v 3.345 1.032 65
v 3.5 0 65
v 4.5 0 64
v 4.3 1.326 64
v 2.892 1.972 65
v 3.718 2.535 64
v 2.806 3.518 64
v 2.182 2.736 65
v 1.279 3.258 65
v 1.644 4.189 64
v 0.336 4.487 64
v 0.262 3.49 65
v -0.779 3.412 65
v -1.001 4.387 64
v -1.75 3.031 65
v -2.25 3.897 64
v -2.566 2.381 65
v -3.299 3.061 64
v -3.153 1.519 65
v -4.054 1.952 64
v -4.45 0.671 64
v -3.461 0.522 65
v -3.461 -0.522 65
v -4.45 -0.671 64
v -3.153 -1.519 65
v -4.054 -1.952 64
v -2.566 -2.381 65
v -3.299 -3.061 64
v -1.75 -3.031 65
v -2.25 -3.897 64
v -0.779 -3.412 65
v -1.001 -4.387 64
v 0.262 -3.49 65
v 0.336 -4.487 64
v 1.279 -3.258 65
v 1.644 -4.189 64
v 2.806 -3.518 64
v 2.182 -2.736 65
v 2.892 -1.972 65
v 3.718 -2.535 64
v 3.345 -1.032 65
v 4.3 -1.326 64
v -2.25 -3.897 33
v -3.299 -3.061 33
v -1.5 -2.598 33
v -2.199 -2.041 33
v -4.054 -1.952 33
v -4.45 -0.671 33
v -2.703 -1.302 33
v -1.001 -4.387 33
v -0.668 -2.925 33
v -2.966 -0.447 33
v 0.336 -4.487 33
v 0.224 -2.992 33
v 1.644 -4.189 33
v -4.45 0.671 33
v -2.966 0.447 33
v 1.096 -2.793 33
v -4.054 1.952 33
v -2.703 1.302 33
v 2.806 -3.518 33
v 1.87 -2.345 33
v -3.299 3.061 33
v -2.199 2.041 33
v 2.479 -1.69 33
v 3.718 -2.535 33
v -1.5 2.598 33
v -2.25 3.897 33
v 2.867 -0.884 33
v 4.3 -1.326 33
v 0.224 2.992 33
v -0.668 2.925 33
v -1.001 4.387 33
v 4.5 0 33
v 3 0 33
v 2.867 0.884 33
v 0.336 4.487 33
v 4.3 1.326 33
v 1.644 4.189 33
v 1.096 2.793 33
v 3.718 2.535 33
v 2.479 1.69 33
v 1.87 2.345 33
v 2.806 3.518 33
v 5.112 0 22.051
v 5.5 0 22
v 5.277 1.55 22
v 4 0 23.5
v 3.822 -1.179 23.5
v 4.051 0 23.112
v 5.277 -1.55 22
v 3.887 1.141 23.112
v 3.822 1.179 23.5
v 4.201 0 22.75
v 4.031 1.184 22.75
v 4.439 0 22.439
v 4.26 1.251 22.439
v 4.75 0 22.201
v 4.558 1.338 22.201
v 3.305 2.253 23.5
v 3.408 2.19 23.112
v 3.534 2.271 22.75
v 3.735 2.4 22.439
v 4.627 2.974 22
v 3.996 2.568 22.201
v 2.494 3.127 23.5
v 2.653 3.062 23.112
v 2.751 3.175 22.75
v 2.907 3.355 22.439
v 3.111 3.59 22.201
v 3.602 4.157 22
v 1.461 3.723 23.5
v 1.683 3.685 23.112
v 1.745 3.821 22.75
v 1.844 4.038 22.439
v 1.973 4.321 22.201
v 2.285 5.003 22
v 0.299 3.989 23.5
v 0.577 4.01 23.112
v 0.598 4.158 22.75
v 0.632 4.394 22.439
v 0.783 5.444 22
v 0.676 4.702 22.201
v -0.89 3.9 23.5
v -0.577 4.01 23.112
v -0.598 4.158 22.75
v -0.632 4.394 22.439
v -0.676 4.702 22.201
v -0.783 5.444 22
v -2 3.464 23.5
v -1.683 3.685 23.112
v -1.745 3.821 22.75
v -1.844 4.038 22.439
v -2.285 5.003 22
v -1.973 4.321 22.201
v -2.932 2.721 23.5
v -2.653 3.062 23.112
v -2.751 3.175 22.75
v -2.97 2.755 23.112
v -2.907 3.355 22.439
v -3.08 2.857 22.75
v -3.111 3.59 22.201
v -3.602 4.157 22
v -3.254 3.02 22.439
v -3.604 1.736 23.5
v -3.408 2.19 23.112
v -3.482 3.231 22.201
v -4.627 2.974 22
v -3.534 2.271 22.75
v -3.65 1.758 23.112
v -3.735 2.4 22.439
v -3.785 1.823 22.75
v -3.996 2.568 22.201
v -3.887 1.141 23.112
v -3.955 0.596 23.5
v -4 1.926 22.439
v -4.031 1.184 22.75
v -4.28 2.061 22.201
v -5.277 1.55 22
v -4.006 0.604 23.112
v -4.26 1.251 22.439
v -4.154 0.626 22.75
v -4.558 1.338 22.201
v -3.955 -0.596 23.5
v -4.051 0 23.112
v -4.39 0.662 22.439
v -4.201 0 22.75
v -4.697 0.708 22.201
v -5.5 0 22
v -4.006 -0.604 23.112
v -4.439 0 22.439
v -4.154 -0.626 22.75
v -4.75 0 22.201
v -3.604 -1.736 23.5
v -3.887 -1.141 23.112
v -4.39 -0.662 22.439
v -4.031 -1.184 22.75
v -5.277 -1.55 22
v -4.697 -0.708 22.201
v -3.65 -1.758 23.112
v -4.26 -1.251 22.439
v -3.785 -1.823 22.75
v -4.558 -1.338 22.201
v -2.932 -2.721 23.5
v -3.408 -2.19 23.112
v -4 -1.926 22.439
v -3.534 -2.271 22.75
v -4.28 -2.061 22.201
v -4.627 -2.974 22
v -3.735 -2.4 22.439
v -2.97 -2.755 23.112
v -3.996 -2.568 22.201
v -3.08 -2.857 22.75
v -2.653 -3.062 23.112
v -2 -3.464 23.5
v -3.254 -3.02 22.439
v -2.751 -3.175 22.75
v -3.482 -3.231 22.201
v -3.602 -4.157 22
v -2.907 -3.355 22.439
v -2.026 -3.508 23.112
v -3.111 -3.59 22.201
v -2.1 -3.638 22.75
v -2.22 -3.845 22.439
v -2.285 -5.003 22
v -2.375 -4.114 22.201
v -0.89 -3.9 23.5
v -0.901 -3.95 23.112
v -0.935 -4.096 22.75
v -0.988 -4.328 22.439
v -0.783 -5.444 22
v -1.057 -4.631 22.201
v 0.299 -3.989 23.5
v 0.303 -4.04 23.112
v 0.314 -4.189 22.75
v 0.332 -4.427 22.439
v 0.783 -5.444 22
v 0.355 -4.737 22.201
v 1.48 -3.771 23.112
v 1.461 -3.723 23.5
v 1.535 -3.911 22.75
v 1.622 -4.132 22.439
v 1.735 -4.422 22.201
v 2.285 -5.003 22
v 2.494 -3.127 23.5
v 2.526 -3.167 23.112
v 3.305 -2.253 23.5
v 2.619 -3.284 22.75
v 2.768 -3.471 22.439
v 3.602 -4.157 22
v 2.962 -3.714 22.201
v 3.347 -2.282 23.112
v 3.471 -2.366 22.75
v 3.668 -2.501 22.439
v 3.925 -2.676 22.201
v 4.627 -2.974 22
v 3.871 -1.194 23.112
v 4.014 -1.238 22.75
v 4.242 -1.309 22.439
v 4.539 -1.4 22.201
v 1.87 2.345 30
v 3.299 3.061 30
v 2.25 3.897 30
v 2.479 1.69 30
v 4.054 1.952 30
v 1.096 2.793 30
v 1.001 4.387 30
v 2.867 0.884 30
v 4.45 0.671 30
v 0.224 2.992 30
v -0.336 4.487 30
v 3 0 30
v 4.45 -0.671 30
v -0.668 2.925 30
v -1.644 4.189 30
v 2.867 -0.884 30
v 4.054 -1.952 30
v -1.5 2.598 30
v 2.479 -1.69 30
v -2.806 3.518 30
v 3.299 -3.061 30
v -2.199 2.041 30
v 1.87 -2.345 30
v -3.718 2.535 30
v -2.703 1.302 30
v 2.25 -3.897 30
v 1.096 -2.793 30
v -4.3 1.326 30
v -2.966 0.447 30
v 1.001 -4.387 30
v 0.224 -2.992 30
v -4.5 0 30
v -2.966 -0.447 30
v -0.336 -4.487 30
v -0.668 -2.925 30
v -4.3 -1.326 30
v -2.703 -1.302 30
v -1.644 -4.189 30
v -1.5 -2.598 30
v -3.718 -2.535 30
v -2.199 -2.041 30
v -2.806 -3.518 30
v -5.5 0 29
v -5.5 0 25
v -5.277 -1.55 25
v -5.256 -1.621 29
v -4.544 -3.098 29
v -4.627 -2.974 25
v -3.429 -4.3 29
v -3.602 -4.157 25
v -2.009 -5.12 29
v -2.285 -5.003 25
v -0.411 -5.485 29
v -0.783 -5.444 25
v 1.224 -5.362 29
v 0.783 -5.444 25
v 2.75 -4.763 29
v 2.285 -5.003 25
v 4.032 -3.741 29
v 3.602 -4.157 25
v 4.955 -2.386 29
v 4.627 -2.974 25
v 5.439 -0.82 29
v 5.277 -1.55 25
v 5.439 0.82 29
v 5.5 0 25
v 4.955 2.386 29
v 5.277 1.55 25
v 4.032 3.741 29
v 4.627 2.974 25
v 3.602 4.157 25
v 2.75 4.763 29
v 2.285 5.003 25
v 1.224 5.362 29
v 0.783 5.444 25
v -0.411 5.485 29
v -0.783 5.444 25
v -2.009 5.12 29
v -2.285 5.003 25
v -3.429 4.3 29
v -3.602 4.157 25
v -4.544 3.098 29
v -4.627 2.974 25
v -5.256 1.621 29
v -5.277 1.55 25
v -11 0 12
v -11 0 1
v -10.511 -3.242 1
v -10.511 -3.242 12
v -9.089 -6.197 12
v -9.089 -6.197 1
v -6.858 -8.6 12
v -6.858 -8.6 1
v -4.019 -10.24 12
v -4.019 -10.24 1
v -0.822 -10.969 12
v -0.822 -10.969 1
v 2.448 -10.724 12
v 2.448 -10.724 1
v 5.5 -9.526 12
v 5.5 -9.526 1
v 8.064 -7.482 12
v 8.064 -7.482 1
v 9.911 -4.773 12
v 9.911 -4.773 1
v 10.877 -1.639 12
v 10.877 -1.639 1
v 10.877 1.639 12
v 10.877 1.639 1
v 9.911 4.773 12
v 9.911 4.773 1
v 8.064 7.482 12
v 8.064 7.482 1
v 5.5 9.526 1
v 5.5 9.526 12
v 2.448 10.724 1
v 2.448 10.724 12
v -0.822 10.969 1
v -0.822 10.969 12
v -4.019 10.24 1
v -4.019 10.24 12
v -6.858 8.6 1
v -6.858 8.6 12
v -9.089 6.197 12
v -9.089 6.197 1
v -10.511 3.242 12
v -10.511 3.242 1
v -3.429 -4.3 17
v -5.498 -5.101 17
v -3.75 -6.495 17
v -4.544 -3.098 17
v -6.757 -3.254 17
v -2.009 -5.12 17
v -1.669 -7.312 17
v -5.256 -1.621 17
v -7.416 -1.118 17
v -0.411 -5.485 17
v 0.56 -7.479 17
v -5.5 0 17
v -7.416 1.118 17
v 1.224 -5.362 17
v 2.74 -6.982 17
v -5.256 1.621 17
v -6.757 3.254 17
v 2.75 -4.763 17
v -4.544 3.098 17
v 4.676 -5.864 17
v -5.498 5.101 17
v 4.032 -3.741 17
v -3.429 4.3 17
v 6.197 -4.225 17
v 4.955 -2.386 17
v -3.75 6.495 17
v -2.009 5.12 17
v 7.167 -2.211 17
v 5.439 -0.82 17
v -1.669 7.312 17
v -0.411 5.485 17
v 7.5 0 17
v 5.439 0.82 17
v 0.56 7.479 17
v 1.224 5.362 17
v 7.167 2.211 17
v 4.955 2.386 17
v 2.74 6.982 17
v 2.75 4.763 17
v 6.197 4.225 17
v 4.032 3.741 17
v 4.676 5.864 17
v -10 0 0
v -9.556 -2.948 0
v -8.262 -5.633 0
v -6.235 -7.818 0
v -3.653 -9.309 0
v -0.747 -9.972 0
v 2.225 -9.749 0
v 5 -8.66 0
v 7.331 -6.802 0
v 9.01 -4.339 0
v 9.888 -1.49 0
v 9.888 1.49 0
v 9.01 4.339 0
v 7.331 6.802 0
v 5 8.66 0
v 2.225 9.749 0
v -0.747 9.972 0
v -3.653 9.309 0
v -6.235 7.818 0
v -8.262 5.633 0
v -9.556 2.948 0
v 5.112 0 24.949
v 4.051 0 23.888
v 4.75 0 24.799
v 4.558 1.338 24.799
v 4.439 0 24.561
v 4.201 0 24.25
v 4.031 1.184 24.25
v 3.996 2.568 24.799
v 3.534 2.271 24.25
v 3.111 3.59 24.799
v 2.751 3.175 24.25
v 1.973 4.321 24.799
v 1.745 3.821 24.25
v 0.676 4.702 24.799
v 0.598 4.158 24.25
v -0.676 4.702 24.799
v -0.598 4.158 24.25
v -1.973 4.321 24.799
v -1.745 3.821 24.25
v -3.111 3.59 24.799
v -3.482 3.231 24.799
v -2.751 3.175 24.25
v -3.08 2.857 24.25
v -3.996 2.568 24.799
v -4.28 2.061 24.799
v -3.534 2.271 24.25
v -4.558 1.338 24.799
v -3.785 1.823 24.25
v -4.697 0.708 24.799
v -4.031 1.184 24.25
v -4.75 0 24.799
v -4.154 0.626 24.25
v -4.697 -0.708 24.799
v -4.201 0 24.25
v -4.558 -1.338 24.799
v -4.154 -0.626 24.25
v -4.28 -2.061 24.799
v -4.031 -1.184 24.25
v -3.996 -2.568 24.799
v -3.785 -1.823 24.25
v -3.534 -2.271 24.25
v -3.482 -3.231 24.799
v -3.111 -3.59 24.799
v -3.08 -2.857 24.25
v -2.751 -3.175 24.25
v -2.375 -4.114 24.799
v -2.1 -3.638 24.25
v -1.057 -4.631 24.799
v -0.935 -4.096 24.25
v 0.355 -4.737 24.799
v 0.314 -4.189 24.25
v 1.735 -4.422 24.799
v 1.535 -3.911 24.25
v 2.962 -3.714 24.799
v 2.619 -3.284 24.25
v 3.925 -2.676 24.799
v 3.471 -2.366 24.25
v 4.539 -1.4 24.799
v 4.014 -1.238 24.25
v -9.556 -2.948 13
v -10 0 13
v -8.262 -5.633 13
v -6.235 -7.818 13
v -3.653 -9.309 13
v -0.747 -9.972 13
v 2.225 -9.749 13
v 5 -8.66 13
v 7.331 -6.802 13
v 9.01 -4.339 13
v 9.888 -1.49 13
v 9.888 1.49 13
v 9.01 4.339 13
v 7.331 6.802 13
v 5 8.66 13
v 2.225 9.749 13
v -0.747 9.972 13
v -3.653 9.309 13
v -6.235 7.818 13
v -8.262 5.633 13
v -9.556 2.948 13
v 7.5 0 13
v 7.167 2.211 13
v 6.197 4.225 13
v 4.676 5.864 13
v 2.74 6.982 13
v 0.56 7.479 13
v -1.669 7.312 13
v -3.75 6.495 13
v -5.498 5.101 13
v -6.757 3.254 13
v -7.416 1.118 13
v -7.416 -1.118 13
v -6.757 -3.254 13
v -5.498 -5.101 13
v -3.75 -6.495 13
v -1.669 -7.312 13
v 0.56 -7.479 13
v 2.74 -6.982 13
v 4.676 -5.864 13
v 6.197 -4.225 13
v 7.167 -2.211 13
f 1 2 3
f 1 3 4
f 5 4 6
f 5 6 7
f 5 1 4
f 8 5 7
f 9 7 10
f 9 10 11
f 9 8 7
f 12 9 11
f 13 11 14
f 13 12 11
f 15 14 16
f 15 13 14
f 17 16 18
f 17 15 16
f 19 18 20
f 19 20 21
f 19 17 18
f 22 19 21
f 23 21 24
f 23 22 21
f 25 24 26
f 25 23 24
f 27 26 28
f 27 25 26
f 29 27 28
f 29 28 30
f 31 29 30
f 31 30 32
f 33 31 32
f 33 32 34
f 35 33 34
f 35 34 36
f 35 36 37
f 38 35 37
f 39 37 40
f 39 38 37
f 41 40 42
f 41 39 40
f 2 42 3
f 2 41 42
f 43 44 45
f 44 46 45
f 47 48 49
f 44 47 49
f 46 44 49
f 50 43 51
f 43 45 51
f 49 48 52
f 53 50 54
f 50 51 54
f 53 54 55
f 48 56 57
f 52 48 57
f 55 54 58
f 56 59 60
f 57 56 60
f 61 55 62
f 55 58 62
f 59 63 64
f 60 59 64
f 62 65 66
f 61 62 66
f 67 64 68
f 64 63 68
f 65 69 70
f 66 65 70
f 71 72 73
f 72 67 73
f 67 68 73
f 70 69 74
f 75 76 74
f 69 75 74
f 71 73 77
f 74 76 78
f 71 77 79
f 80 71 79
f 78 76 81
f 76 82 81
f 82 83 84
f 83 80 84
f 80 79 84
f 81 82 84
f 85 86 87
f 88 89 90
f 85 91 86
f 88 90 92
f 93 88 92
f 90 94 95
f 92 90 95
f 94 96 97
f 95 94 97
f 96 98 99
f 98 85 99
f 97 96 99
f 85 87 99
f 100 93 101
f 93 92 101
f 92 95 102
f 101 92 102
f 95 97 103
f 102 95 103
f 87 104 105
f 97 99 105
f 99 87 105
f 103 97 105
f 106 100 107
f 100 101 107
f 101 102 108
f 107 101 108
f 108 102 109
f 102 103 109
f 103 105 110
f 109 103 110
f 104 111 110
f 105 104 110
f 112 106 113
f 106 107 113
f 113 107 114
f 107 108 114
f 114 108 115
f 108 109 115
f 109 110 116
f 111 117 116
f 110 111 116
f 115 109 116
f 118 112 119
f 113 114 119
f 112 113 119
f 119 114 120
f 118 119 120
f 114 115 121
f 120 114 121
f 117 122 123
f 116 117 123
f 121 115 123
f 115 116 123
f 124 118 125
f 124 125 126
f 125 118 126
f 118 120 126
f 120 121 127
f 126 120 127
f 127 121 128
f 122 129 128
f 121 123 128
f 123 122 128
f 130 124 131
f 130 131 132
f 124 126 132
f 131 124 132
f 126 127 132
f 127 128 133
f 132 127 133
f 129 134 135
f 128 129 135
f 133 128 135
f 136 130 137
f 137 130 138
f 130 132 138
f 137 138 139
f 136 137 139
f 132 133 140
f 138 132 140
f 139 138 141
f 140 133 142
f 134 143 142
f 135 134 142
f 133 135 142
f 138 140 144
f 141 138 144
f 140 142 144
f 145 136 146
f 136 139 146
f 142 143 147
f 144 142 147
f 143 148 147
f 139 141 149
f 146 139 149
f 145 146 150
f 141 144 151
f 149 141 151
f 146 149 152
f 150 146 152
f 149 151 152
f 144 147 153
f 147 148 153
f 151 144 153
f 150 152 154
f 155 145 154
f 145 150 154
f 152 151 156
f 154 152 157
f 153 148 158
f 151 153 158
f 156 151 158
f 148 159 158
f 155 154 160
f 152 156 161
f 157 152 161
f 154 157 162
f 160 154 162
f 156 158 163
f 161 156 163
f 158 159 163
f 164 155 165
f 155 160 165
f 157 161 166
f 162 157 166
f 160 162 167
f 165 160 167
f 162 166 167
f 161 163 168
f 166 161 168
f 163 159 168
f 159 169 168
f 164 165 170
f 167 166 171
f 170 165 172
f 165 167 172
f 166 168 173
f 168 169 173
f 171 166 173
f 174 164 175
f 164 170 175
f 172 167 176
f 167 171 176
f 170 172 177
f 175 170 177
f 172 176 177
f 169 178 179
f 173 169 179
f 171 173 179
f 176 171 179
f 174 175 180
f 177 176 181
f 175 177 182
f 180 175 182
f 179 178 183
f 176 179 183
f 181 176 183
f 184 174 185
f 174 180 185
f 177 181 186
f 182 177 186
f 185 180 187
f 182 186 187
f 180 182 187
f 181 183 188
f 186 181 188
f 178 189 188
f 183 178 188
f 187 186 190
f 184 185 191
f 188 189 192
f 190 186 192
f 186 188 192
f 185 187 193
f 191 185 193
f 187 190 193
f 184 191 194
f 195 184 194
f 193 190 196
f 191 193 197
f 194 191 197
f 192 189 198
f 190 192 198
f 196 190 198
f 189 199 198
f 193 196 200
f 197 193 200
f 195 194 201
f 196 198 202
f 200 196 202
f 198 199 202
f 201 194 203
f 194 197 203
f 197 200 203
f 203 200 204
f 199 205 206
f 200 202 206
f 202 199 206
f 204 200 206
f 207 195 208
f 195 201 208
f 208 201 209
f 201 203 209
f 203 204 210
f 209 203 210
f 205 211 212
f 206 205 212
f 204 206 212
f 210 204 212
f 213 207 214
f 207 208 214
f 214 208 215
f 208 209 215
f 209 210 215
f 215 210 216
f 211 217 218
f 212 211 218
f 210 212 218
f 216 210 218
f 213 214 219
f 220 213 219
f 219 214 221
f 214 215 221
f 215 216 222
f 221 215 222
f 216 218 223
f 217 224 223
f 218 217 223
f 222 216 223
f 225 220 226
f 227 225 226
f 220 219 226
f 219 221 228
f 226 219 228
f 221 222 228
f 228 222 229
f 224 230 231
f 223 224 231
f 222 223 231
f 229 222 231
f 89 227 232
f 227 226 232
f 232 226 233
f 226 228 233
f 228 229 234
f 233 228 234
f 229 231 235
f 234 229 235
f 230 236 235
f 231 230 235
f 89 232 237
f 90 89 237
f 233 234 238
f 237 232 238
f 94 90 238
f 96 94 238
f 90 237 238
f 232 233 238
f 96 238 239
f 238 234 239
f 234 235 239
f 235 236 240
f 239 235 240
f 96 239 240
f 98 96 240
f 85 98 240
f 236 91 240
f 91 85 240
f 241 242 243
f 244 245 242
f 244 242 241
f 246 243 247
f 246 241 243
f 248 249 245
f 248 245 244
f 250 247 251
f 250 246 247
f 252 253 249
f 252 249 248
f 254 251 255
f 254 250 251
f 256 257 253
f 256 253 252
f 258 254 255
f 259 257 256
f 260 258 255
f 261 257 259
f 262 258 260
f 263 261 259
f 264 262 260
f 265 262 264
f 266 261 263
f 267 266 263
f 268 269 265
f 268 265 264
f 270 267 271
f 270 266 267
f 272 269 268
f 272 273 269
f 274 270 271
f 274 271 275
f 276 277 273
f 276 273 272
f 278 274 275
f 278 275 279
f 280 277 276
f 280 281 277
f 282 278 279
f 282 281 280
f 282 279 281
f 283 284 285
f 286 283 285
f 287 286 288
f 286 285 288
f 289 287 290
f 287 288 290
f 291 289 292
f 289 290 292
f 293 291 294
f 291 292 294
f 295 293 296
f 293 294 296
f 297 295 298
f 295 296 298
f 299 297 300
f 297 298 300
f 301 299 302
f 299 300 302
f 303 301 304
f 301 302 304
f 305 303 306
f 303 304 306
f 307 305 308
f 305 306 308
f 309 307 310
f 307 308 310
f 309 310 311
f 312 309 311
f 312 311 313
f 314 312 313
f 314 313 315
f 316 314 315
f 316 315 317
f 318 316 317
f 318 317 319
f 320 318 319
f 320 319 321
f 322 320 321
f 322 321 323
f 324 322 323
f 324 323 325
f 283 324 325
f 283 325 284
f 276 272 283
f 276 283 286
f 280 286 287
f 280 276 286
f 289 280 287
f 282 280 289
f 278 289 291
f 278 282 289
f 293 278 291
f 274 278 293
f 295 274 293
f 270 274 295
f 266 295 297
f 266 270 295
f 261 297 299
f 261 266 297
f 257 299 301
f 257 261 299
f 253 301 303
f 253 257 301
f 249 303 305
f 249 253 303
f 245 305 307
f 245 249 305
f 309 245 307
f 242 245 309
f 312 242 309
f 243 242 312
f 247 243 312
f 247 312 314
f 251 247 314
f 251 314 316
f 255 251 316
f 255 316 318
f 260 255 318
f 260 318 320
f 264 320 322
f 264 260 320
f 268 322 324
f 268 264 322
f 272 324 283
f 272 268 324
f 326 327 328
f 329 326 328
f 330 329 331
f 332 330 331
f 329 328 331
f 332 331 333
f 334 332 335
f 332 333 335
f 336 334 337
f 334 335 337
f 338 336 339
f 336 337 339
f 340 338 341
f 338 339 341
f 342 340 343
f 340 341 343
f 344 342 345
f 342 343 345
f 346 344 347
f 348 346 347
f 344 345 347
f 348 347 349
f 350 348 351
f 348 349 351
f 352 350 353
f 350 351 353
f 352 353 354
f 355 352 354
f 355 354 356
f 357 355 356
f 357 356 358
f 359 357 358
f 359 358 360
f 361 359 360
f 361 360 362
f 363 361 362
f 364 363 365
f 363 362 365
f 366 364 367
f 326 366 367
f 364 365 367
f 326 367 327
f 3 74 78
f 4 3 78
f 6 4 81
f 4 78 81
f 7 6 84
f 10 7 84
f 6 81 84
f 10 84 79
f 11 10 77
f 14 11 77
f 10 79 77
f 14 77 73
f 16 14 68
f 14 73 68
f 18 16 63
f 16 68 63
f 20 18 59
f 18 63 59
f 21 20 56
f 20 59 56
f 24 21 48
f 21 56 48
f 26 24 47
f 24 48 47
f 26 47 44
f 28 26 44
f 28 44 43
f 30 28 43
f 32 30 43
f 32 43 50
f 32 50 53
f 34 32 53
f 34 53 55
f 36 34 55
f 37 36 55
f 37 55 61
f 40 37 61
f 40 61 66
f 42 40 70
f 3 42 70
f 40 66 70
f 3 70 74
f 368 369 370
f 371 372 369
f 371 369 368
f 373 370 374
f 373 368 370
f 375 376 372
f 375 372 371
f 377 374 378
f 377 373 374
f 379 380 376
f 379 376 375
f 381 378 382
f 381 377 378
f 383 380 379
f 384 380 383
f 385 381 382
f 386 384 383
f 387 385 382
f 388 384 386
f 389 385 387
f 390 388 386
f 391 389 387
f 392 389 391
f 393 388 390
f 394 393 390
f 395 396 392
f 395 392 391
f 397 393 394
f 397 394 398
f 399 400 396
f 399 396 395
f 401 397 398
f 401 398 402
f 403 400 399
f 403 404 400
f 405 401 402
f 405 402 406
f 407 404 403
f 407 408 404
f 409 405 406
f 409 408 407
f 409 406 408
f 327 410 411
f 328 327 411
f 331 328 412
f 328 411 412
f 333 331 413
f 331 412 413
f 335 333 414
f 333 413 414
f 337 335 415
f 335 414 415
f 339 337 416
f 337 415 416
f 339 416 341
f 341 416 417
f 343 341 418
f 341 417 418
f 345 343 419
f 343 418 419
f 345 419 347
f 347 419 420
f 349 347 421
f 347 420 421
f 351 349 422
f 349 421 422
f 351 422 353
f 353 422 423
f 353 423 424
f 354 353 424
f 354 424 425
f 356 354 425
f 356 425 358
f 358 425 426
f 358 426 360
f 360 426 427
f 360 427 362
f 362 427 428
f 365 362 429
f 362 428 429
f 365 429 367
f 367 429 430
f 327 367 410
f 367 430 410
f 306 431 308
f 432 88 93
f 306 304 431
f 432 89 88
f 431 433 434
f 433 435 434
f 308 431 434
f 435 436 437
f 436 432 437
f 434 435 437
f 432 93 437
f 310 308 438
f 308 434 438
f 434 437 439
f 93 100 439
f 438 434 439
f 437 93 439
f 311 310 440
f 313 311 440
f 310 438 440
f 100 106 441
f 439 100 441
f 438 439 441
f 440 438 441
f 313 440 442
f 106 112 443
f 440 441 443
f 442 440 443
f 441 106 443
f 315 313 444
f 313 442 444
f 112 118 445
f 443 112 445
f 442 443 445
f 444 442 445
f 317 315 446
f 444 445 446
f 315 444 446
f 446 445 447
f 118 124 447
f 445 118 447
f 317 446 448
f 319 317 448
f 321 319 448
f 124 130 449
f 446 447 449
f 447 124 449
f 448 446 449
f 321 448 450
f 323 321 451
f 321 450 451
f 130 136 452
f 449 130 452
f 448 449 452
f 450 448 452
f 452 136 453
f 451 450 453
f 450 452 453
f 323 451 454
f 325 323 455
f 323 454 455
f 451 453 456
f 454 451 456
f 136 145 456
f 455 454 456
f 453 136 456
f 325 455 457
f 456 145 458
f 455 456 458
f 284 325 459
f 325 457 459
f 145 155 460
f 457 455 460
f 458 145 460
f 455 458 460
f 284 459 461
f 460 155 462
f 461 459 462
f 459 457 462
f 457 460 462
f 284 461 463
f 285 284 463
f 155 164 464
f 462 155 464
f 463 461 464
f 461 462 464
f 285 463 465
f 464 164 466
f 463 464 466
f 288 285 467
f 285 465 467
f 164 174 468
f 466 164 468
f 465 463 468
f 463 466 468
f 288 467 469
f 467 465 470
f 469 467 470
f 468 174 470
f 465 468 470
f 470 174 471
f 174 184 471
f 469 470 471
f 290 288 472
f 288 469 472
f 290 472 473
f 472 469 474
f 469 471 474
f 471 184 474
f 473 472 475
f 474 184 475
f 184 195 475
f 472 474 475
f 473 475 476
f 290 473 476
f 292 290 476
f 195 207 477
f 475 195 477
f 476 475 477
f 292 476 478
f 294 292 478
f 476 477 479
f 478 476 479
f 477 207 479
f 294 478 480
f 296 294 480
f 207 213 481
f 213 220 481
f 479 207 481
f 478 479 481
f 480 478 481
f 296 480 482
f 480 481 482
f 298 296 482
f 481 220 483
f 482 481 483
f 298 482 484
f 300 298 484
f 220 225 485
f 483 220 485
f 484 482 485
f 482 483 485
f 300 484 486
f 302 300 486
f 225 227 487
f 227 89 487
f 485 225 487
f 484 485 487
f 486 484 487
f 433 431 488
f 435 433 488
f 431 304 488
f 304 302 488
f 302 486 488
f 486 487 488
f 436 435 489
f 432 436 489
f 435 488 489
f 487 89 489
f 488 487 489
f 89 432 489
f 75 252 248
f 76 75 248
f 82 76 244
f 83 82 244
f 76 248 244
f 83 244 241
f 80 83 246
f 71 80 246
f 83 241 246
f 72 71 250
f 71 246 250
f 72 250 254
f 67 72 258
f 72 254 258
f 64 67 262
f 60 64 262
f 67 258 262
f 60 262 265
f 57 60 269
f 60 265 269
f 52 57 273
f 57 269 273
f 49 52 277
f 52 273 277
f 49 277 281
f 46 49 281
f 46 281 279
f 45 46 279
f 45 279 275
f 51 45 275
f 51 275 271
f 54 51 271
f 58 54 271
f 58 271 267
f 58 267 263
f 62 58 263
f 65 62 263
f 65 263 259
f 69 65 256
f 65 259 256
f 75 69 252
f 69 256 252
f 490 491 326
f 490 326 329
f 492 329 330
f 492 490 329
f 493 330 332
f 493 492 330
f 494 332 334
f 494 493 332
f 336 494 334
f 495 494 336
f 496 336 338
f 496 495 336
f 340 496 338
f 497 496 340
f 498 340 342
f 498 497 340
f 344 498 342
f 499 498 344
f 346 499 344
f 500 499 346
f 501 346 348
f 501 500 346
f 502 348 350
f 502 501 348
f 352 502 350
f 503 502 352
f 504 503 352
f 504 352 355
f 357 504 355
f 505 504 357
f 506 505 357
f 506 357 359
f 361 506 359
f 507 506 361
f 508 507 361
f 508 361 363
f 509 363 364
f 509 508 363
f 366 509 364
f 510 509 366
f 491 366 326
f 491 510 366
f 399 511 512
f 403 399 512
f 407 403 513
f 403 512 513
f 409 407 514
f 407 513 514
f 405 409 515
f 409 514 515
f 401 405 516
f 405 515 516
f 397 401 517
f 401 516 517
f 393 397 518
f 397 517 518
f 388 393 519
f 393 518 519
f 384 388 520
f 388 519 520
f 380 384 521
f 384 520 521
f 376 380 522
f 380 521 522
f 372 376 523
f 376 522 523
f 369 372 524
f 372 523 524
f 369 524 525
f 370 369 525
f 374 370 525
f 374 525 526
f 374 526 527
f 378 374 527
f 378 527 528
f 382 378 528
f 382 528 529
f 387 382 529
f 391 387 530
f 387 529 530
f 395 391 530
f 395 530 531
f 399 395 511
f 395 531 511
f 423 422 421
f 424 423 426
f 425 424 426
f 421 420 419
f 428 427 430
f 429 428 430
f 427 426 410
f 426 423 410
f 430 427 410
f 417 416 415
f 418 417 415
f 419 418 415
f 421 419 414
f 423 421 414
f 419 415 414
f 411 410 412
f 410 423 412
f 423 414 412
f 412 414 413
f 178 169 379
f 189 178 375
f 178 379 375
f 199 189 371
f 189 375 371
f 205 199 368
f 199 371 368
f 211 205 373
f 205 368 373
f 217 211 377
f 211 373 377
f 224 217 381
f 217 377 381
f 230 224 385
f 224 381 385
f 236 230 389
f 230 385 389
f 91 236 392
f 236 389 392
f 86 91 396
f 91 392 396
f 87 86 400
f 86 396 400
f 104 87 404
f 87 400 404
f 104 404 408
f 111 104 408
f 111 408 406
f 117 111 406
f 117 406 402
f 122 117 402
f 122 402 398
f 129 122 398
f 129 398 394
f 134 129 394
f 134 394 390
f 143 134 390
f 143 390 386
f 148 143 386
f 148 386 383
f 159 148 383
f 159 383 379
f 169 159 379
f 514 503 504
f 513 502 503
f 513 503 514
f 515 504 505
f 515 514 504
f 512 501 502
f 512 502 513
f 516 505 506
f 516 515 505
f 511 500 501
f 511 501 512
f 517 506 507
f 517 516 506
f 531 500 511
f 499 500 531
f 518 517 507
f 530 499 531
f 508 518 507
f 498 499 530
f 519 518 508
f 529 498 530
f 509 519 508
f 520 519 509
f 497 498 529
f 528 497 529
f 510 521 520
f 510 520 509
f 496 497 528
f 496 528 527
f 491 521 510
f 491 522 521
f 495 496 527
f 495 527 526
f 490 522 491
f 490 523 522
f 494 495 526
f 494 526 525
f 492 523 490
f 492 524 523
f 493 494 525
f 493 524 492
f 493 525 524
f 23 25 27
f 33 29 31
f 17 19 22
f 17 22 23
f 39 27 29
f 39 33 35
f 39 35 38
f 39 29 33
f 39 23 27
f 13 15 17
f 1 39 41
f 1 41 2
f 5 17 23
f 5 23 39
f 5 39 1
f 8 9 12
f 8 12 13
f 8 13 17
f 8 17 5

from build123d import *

# Parameters (mm, degrees)
ESBO_O1_R                = 11
RESSALTO_EXTRUS_O1_DEPTH = 13
ESBO_O2_R                = 7.5
RESSALTO_EXTRUS_O2_DEPTH = 4
ESBO_O3_R                = 5.5
RESSALTO_EXTRUS_O3_DEPTH = 13
ESBO_O4_R                = 3
RESSALTO_EXTRUS_O4_DEPTH = 3
ESBO_O5_R                = 4.5
RESSALTO_EXTRUS_O5_DEPTH = 32
CHANFRO1_SIZE            = 1
CHANFRO2_SIZE            = 1
ESBO_O6_R                = 1.5


with BuildPart() as part:
    # Esboço1 → Ressalto-extrusão1 (new body)
    with BuildSketch(Plane.XY):
        with Locations(Location((0, 0, 0), (0, 0, 180))):
            Circle(ESBO_O1_R)
    extrude(amount=RESSALTO_EXTRUS_O1_DEPTH)

    # Esboço2 → Ressalto-extrusão2 (add)
    with BuildSketch(Plane.XY.offset(13)):
        Circle(ESBO_O2_R)
    extrude(amount=RESSALTO_EXTRUS_O2_DEPTH)

    # Esboço3 → Ressalto-extrusão3 (add)
    with BuildSketch(Plane.XY.offset(17)):
        with Locations(Location((0, 0, 0), (0, 0, 180))):
            Circle(ESBO_O3_R)
    extrude(amount=RESSALTO_EXTRUS_O3_DEPTH)

    # Esboço4 → Ressalto-extrusão4 (add)
    with BuildSketch(Plane.XY.offset(30)):
        Circle(ESBO_O4_R)
    extrude(amount=RESSALTO_EXTRUS_O4_DEPTH)

    # Esboço5 → Ressalto-extrusão5 (add)
    with BuildSketch(Plane.XY.offset(33)):
        Circle(ESBO_O5_R)
    extrude(amount=RESSALTO_EXTRUS_O5_DEPTH)

    # Chanfro1
    chanfro1_edges = [part.edges().sort_by_distance(p)[0] for p in [
        (11, 0, 0),
    ]]
    chamfer(chanfro1_edges, length=CHANFRO1_SIZE)

    # Chanfro2
    chanfro2_edges = [part.edges().sort_by_distance(p)[0] for p in [
        (5.5, 0, 30),
        (-4.5, 0, 65),
        (11, 0, 13),
    ]]
    chamfer(chanfro2_edges, length=CHANFRO2_SIZE)

    # Varredura de corte1: sweep along a path in Esboço7
    with BuildLine(Plane.XY.offset(23.5)) as varredura_de_corte1_path:
        CenterArc((0, 0), 5.5, 0, 360)
    # Esboço6 → Varredura de corte1 (sweep, cut)
    with BuildSketch(Plane(origin=(0, 0, 0), x_dir=(1, 0, 0), z_dir=(0, 1, 0))):
        with Locations((-5.5, -23.5)):
            Circle(ESBO_O6_R)
    sweep(path=varredura_de_corte1_path.line, mode=Mode.SUBTRACT)


solid = part.part
